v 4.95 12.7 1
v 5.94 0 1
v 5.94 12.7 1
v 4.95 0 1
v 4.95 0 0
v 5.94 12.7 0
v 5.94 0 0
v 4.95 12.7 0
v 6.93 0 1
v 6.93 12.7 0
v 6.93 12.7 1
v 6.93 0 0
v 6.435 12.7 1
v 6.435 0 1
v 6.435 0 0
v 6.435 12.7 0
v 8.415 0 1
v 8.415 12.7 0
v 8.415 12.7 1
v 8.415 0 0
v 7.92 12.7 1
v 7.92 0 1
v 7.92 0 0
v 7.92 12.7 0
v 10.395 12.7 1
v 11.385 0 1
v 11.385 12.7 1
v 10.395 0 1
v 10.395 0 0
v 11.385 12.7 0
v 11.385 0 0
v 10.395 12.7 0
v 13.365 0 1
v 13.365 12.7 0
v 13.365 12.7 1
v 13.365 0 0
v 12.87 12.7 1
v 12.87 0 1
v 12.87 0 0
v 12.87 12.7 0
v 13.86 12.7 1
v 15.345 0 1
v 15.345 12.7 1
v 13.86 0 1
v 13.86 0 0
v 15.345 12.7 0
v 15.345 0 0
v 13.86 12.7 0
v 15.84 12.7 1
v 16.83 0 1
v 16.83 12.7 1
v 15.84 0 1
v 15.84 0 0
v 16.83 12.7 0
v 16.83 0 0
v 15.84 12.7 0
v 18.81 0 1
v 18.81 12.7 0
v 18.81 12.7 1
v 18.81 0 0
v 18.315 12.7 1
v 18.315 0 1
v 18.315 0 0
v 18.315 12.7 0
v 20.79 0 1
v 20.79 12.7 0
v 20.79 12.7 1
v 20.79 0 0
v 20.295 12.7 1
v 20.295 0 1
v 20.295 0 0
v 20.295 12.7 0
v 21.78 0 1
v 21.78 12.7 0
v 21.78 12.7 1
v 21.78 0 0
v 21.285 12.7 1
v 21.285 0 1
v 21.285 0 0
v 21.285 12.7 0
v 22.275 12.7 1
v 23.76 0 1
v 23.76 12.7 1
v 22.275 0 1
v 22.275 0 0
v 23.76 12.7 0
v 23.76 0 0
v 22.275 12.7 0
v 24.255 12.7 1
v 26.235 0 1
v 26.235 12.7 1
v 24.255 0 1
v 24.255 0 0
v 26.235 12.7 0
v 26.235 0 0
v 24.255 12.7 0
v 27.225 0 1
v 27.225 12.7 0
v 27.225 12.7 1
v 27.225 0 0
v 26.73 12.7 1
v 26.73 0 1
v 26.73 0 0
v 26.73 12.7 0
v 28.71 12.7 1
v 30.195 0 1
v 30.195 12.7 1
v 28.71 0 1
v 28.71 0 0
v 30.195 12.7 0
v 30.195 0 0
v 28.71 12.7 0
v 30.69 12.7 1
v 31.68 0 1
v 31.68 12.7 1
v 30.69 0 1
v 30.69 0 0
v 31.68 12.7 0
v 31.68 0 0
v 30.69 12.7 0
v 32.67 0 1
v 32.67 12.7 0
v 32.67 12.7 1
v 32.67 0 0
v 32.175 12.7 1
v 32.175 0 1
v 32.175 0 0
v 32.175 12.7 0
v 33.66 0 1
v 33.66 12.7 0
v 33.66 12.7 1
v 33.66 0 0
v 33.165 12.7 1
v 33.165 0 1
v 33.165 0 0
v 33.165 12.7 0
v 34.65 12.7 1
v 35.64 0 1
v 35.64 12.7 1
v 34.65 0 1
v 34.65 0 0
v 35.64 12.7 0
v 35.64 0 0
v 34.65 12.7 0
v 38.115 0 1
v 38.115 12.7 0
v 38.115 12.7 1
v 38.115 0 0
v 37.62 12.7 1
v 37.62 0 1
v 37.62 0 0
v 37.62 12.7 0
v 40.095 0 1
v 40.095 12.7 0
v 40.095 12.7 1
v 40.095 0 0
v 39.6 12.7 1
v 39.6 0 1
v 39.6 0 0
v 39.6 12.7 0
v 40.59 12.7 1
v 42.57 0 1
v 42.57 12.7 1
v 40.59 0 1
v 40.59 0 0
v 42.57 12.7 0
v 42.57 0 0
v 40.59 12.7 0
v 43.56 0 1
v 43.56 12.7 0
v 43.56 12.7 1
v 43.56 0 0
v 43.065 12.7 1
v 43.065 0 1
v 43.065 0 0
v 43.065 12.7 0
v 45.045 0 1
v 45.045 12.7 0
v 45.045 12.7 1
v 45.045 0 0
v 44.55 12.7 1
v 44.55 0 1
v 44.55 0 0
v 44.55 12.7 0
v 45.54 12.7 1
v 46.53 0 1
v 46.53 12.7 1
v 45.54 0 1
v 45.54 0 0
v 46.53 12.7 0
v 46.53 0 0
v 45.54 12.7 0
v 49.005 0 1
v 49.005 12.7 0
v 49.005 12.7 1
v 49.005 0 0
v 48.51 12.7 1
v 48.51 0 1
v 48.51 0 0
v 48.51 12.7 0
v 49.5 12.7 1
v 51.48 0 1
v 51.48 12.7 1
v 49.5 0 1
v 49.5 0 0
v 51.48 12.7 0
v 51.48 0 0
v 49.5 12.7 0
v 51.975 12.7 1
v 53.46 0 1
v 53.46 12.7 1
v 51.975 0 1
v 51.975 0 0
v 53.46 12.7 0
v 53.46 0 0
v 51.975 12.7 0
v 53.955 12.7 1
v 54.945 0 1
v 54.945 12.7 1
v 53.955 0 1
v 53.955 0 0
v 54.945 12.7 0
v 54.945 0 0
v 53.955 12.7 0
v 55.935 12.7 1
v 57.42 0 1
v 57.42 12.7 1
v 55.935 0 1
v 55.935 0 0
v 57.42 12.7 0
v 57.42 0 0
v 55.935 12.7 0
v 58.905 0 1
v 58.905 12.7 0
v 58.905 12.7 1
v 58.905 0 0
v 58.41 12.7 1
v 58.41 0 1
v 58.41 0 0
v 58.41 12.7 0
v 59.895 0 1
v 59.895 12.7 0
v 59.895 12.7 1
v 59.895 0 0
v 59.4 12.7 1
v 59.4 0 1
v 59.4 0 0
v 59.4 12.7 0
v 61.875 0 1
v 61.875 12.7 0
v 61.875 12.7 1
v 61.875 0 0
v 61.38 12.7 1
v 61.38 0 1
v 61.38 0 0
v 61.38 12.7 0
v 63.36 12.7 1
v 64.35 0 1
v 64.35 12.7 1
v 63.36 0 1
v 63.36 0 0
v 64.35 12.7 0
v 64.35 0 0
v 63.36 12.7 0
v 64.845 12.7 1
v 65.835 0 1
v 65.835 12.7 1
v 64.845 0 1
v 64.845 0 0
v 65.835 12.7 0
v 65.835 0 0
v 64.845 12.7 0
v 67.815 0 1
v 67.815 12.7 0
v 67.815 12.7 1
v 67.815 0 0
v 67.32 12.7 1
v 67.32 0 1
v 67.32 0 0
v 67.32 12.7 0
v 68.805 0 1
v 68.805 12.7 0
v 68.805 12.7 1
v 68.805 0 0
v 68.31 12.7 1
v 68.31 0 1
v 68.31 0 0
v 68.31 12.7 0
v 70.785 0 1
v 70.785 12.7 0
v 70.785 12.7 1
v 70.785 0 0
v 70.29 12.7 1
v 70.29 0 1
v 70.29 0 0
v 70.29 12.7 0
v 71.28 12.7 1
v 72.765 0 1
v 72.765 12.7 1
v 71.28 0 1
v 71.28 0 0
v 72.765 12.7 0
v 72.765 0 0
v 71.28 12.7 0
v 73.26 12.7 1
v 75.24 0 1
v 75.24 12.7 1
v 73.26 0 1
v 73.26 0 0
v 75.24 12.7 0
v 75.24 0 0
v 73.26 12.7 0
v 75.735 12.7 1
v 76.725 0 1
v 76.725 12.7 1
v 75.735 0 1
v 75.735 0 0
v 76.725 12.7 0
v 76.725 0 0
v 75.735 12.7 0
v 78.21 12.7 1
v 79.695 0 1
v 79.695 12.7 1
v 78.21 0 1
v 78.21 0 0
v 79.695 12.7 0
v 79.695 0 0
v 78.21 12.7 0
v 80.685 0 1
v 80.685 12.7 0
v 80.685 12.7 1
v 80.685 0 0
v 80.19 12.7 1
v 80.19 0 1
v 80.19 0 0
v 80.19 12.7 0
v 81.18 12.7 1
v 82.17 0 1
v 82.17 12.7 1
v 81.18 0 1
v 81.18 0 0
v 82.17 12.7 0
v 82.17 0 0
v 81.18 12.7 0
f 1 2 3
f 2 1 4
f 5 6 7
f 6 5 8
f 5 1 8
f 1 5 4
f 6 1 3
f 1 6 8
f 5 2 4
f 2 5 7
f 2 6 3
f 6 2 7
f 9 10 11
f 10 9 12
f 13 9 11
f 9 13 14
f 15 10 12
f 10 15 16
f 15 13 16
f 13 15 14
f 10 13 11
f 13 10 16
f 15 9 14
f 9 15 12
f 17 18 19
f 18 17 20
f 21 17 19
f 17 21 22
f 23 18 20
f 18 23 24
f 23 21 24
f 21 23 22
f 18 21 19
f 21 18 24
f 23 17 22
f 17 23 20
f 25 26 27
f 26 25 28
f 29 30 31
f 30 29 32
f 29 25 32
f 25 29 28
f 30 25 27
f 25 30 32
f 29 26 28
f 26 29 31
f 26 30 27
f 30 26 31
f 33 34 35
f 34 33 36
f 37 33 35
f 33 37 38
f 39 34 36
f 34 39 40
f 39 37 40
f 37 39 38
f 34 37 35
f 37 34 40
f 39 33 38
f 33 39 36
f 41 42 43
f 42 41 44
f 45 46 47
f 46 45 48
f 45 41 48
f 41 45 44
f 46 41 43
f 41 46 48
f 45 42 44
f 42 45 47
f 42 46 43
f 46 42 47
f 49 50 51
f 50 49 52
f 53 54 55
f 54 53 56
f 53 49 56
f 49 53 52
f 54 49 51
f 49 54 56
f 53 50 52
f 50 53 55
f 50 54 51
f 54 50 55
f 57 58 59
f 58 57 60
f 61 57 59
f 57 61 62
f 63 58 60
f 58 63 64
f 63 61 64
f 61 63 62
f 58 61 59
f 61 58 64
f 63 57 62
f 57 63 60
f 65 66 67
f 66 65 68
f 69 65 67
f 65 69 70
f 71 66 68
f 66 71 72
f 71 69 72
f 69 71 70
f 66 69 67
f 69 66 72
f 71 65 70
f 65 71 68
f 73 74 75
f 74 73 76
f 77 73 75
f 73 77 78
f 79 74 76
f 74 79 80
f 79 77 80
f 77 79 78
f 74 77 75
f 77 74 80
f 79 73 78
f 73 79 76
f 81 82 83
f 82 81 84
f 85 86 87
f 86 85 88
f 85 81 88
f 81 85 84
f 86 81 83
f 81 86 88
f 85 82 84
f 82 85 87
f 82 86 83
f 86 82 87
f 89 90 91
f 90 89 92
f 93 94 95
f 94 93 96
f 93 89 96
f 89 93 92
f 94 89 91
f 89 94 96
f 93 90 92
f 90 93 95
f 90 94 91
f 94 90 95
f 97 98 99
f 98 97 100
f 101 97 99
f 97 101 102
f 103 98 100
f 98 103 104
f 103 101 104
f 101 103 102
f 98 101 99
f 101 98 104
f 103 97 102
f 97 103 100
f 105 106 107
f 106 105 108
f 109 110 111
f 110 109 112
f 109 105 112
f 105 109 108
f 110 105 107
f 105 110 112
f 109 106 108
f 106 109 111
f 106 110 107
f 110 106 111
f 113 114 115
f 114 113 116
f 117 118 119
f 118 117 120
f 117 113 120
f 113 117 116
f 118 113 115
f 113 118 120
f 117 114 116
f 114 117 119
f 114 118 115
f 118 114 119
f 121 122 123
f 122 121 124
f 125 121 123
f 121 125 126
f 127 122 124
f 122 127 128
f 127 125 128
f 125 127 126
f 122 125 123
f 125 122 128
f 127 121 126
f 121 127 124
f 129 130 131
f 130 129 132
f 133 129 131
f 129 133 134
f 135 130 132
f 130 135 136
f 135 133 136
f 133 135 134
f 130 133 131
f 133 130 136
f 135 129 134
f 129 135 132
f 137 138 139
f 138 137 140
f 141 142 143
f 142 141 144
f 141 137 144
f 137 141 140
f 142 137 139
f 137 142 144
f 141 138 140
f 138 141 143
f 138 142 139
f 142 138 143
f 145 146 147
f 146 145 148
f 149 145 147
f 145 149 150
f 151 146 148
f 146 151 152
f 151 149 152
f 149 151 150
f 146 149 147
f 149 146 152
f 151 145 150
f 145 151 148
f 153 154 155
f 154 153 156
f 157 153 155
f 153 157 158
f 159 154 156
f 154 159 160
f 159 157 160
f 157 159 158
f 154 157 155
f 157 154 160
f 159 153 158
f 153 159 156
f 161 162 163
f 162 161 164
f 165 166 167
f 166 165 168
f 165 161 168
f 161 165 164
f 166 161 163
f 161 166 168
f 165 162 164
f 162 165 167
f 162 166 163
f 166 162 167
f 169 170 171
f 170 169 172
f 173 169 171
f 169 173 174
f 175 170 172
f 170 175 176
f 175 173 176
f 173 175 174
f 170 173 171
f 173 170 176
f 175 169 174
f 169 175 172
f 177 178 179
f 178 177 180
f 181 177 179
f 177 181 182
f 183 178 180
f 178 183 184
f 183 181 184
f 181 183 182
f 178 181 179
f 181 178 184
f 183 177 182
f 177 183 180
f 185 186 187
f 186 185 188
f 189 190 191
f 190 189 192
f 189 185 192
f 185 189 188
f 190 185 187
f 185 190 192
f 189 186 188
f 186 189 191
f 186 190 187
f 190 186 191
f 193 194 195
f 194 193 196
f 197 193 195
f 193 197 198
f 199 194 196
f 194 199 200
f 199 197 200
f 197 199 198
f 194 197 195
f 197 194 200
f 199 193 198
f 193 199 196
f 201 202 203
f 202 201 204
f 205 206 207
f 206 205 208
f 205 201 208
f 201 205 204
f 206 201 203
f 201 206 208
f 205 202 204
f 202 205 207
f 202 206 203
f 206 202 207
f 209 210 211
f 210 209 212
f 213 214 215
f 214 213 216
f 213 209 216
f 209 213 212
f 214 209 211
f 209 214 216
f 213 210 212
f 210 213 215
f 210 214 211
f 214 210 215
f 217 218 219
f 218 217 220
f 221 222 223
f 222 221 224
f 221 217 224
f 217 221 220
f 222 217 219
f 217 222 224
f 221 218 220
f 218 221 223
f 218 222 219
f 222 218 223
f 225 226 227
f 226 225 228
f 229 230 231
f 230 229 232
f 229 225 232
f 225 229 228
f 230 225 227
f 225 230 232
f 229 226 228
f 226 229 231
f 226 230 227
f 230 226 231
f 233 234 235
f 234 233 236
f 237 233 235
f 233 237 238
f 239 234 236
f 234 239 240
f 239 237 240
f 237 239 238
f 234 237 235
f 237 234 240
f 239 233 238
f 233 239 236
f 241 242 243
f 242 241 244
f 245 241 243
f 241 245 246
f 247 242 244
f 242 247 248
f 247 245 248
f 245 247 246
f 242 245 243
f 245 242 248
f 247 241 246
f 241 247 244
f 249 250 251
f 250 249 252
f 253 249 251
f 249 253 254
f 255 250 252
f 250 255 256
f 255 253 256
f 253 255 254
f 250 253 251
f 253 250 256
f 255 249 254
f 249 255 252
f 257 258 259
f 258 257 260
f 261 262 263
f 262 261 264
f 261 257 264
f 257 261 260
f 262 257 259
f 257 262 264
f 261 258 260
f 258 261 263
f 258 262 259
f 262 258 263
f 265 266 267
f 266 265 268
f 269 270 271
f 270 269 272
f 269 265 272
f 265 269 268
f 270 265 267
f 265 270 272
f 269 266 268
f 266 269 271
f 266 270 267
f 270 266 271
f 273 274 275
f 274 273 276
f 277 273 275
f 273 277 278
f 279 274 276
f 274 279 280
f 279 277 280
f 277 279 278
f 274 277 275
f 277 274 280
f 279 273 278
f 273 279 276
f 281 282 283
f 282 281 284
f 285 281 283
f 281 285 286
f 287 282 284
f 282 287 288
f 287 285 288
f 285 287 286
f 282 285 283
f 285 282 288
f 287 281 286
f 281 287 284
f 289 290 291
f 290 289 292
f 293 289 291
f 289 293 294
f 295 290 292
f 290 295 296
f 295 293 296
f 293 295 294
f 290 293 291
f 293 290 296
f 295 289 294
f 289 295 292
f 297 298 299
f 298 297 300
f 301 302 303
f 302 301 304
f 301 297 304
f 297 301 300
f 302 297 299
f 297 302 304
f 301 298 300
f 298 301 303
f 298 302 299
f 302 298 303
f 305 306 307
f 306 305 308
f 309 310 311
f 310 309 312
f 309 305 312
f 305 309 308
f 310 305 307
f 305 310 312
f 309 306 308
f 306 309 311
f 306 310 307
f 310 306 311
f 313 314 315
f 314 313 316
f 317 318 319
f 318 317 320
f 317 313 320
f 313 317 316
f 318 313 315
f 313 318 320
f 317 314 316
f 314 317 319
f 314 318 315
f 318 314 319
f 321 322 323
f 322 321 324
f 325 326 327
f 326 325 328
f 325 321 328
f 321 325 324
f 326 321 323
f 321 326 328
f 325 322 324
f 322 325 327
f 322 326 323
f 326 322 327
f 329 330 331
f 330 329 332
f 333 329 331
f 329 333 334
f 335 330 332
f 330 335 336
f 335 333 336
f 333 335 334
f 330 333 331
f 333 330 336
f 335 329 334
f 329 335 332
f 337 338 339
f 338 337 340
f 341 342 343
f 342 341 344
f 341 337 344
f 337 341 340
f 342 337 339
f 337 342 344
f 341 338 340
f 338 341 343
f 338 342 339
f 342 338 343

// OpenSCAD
// file: ../../util/bitmap.scad
/*****************************************************************************
 * Module Bitmap Library
 * Modules to create bitmaps of unit squares from 1 or 2 dimensional vectors.
 *****************************************************************************
 * Copyright 2017 Chris Baker
 *
 * This program is free software: you can redistribute it and/or modify
 * it under the terms of the GNU Lesser General Public License as published by
 * the Free Software Foundation, either version 3 of the License, or
 * (at your option) any later version.
 *
 * This program is distributed in the hope that it will be useful,
 * but WITHOUT ANY WARRANTY; without even the implied warranty of
 * MERCHANTABILITY or FITNESS FOR A PARTICULAR PURPOSE.  See the
 * GNU Lesser General Public License for more details.
 *
 * You should have received a copy of the GNU Lesser General Public License
 * along with this program.  If not, see <http://www.gnu.org/licenses/>.
 *****************************************************************************
 * Usage:
 * Include this file with the "use" tag.
 * Depends on compat.scad library.
 *
 * API:
 *   1dbitmap(bitmap, center, expansion, vector_mode)
 *   2dbitmap(bitmap, center, expansion, vector_mode)
 *     Generate a 1 or 2-Dimensional field of modules based on the provided
 *     bitmap vector. See Bitmap Vectors below.
 *     The center flag determines whether to center the bitmap on the origin.
 *     The expansion value actually shrinks each cube in the x and y
 *     dimension by the specified amount.
 *     The vector_mode flag determines whether to create 3D solid geometry
 *     (unit cubes) or 2D vector geometry (squares).
 *
 * Bitmap Vectors:
 *   The bitmap vectors primarily provide boolean information.
 *   A module will be placed where these vectors have a postive value and
 *   skipped where they have a negative value. I.E. 0, -1, false, and undef
 *   are all equivalent and result in a skip. 1 and true are equivalent and
 *   result in a placed 1-unit module.
 *   Further, if the value is an integer it will be treated as a height for
 *   the module, allowing z-maps to be created.
 *   If the value is not an integer or boolean, it will be treated as a color
 *   reference. This can be a string or RGBA vector that will be used to
 *   color the module in the OpenSCAD preview window.
 *   In current versions of OpenSCAD, the color has no effect in the rendered
 *   view or STL output.
 *
 * Vector Mode:
 *   Although OpenSCAD supports generating 2D geometry, there are several
 *   caveats:
 *   - 2D and 3D geometry cannot be mixed
 *   - Extruding 2D geometry causes color information to be lost
 *   - All 2D geometry is projected onto the XY plane when rendering
 *   - Rendering also results in loss of color (same as 3D)
 *   - The SVG exporter is somewhat limited:
 *     - The pixel size of the image is hard-coded in the file
 *     - The title of the image is a generic string
 *     - The color selection for stroke and fill is fixed
 *     - The stroke-width is set to a large value that will cause overlap
 *     - The background is transparent
 *     - Only one path element is created with all of the geometry; there is
 *       no easy way to split up the geometry into multiple logical units.
 *     - These issues can mostly be resolved by hand-editing the file:
 *       - Remove or modify the width and height parameters from the svg
 *         element at the top of the file to provide better scaling.
 *       - Edit the title element at the top of the file to change the title.
 *       - Edit the stroke and fill parameters of the path element (these will
 *         probably be at the end of the file).
 *       - Set the stroke-width parameter for the path element to 0.
 *****************************************************************************/
use <compat.scad>

/*
 * 2dbitmap - Turn a 2D vector into a bitmap of cubes
 *
 * bitmap - 2D vector representing where to place each cube
 *          Value can either be boolean, z-height, or color
 * center - center cubes around the origin
 * expansion - size of gap around each pixel (screendoor)
 * vector_mode - create a 2D vector drawing instead of 3D extrusion
 */
module 2dbitmap(bitmap=[[1,0],[0,1]], center=false, expansion=0, vector_mode=false)
{
	ylen=len(bitmap)-1;

	for (y=[0:ylen]) {
		xlen=len(bitmap[y])-1;
		for (x=[0:xlen])
			translate([x-(center?xlen/2:0),ylen-y-(center?ylen/2:0),0])
				if (is_indexable(bitmap[y][x]))
					color(bitmap[y][x])
						if (vector_mode)
							square([1-expansion,1-expansion], center=center);
						else
							cube([1-expansion,1-expansion,1], center=center);
				else
					if (bitmap[y][x])
						if (vector_mode)
							square([1-expansion,1-expansion], center=center);
						else
							cube([1-expansion,1-expansion,clamp_nonnum(bitmap[y][x])], center=center);
	}
}

module 1dbitmap(bitmap=[1,0,1,0,1], center=false, expansion=0, vector_mode=false)
	2dbitmap([bitmap], center, expansion, vector_mode);

/*
 * Examples
 */

// 1D with z-height
translate([10,0,0]) scale([1,10,1])
	1dbitmap(bitmap=[1,1,0,2,0,0,3], expansion=.1);

// 1D with boolean
translate([-20,0,0]) scale([1,10,1])
	1dbitmap(bitmap=[true,false,true,false,true,true]);

// 2D with z-height
scale([2,2,1])
	2dbitmap(bitmap=[[1,0,2,1],[0,3,3,0],[1,1,0,1]],
		center=true);

// 1D with color
translate([0,-10,0]) scale([1,3,1])
	1dbitmap(bitmap=["red","white","blue",[0,0.3,0,0.5]]);

// 1D with color using 2D-vector-mode
translate([-7,-8,0]) scale([1,2])
	1dbitmap(bitmap=["red",0,"blue",0,"green"], vector_mode=true);
translate([-4.5,-10,0]) scale([1,2])
	1dbitmap(bitmap=["red",0,"blue",0,"green"], vector_mode=true, center=true);
// main file
/* Unit Test 00: Canonical Example with mixed symbologies */
use <../code128.scad>

code_128(concat(cs128_b("RI"),
		cs128_c([4,7,6,3,9,4,6,5,]),
		cs128_b("2CH")),
	bar="black");
